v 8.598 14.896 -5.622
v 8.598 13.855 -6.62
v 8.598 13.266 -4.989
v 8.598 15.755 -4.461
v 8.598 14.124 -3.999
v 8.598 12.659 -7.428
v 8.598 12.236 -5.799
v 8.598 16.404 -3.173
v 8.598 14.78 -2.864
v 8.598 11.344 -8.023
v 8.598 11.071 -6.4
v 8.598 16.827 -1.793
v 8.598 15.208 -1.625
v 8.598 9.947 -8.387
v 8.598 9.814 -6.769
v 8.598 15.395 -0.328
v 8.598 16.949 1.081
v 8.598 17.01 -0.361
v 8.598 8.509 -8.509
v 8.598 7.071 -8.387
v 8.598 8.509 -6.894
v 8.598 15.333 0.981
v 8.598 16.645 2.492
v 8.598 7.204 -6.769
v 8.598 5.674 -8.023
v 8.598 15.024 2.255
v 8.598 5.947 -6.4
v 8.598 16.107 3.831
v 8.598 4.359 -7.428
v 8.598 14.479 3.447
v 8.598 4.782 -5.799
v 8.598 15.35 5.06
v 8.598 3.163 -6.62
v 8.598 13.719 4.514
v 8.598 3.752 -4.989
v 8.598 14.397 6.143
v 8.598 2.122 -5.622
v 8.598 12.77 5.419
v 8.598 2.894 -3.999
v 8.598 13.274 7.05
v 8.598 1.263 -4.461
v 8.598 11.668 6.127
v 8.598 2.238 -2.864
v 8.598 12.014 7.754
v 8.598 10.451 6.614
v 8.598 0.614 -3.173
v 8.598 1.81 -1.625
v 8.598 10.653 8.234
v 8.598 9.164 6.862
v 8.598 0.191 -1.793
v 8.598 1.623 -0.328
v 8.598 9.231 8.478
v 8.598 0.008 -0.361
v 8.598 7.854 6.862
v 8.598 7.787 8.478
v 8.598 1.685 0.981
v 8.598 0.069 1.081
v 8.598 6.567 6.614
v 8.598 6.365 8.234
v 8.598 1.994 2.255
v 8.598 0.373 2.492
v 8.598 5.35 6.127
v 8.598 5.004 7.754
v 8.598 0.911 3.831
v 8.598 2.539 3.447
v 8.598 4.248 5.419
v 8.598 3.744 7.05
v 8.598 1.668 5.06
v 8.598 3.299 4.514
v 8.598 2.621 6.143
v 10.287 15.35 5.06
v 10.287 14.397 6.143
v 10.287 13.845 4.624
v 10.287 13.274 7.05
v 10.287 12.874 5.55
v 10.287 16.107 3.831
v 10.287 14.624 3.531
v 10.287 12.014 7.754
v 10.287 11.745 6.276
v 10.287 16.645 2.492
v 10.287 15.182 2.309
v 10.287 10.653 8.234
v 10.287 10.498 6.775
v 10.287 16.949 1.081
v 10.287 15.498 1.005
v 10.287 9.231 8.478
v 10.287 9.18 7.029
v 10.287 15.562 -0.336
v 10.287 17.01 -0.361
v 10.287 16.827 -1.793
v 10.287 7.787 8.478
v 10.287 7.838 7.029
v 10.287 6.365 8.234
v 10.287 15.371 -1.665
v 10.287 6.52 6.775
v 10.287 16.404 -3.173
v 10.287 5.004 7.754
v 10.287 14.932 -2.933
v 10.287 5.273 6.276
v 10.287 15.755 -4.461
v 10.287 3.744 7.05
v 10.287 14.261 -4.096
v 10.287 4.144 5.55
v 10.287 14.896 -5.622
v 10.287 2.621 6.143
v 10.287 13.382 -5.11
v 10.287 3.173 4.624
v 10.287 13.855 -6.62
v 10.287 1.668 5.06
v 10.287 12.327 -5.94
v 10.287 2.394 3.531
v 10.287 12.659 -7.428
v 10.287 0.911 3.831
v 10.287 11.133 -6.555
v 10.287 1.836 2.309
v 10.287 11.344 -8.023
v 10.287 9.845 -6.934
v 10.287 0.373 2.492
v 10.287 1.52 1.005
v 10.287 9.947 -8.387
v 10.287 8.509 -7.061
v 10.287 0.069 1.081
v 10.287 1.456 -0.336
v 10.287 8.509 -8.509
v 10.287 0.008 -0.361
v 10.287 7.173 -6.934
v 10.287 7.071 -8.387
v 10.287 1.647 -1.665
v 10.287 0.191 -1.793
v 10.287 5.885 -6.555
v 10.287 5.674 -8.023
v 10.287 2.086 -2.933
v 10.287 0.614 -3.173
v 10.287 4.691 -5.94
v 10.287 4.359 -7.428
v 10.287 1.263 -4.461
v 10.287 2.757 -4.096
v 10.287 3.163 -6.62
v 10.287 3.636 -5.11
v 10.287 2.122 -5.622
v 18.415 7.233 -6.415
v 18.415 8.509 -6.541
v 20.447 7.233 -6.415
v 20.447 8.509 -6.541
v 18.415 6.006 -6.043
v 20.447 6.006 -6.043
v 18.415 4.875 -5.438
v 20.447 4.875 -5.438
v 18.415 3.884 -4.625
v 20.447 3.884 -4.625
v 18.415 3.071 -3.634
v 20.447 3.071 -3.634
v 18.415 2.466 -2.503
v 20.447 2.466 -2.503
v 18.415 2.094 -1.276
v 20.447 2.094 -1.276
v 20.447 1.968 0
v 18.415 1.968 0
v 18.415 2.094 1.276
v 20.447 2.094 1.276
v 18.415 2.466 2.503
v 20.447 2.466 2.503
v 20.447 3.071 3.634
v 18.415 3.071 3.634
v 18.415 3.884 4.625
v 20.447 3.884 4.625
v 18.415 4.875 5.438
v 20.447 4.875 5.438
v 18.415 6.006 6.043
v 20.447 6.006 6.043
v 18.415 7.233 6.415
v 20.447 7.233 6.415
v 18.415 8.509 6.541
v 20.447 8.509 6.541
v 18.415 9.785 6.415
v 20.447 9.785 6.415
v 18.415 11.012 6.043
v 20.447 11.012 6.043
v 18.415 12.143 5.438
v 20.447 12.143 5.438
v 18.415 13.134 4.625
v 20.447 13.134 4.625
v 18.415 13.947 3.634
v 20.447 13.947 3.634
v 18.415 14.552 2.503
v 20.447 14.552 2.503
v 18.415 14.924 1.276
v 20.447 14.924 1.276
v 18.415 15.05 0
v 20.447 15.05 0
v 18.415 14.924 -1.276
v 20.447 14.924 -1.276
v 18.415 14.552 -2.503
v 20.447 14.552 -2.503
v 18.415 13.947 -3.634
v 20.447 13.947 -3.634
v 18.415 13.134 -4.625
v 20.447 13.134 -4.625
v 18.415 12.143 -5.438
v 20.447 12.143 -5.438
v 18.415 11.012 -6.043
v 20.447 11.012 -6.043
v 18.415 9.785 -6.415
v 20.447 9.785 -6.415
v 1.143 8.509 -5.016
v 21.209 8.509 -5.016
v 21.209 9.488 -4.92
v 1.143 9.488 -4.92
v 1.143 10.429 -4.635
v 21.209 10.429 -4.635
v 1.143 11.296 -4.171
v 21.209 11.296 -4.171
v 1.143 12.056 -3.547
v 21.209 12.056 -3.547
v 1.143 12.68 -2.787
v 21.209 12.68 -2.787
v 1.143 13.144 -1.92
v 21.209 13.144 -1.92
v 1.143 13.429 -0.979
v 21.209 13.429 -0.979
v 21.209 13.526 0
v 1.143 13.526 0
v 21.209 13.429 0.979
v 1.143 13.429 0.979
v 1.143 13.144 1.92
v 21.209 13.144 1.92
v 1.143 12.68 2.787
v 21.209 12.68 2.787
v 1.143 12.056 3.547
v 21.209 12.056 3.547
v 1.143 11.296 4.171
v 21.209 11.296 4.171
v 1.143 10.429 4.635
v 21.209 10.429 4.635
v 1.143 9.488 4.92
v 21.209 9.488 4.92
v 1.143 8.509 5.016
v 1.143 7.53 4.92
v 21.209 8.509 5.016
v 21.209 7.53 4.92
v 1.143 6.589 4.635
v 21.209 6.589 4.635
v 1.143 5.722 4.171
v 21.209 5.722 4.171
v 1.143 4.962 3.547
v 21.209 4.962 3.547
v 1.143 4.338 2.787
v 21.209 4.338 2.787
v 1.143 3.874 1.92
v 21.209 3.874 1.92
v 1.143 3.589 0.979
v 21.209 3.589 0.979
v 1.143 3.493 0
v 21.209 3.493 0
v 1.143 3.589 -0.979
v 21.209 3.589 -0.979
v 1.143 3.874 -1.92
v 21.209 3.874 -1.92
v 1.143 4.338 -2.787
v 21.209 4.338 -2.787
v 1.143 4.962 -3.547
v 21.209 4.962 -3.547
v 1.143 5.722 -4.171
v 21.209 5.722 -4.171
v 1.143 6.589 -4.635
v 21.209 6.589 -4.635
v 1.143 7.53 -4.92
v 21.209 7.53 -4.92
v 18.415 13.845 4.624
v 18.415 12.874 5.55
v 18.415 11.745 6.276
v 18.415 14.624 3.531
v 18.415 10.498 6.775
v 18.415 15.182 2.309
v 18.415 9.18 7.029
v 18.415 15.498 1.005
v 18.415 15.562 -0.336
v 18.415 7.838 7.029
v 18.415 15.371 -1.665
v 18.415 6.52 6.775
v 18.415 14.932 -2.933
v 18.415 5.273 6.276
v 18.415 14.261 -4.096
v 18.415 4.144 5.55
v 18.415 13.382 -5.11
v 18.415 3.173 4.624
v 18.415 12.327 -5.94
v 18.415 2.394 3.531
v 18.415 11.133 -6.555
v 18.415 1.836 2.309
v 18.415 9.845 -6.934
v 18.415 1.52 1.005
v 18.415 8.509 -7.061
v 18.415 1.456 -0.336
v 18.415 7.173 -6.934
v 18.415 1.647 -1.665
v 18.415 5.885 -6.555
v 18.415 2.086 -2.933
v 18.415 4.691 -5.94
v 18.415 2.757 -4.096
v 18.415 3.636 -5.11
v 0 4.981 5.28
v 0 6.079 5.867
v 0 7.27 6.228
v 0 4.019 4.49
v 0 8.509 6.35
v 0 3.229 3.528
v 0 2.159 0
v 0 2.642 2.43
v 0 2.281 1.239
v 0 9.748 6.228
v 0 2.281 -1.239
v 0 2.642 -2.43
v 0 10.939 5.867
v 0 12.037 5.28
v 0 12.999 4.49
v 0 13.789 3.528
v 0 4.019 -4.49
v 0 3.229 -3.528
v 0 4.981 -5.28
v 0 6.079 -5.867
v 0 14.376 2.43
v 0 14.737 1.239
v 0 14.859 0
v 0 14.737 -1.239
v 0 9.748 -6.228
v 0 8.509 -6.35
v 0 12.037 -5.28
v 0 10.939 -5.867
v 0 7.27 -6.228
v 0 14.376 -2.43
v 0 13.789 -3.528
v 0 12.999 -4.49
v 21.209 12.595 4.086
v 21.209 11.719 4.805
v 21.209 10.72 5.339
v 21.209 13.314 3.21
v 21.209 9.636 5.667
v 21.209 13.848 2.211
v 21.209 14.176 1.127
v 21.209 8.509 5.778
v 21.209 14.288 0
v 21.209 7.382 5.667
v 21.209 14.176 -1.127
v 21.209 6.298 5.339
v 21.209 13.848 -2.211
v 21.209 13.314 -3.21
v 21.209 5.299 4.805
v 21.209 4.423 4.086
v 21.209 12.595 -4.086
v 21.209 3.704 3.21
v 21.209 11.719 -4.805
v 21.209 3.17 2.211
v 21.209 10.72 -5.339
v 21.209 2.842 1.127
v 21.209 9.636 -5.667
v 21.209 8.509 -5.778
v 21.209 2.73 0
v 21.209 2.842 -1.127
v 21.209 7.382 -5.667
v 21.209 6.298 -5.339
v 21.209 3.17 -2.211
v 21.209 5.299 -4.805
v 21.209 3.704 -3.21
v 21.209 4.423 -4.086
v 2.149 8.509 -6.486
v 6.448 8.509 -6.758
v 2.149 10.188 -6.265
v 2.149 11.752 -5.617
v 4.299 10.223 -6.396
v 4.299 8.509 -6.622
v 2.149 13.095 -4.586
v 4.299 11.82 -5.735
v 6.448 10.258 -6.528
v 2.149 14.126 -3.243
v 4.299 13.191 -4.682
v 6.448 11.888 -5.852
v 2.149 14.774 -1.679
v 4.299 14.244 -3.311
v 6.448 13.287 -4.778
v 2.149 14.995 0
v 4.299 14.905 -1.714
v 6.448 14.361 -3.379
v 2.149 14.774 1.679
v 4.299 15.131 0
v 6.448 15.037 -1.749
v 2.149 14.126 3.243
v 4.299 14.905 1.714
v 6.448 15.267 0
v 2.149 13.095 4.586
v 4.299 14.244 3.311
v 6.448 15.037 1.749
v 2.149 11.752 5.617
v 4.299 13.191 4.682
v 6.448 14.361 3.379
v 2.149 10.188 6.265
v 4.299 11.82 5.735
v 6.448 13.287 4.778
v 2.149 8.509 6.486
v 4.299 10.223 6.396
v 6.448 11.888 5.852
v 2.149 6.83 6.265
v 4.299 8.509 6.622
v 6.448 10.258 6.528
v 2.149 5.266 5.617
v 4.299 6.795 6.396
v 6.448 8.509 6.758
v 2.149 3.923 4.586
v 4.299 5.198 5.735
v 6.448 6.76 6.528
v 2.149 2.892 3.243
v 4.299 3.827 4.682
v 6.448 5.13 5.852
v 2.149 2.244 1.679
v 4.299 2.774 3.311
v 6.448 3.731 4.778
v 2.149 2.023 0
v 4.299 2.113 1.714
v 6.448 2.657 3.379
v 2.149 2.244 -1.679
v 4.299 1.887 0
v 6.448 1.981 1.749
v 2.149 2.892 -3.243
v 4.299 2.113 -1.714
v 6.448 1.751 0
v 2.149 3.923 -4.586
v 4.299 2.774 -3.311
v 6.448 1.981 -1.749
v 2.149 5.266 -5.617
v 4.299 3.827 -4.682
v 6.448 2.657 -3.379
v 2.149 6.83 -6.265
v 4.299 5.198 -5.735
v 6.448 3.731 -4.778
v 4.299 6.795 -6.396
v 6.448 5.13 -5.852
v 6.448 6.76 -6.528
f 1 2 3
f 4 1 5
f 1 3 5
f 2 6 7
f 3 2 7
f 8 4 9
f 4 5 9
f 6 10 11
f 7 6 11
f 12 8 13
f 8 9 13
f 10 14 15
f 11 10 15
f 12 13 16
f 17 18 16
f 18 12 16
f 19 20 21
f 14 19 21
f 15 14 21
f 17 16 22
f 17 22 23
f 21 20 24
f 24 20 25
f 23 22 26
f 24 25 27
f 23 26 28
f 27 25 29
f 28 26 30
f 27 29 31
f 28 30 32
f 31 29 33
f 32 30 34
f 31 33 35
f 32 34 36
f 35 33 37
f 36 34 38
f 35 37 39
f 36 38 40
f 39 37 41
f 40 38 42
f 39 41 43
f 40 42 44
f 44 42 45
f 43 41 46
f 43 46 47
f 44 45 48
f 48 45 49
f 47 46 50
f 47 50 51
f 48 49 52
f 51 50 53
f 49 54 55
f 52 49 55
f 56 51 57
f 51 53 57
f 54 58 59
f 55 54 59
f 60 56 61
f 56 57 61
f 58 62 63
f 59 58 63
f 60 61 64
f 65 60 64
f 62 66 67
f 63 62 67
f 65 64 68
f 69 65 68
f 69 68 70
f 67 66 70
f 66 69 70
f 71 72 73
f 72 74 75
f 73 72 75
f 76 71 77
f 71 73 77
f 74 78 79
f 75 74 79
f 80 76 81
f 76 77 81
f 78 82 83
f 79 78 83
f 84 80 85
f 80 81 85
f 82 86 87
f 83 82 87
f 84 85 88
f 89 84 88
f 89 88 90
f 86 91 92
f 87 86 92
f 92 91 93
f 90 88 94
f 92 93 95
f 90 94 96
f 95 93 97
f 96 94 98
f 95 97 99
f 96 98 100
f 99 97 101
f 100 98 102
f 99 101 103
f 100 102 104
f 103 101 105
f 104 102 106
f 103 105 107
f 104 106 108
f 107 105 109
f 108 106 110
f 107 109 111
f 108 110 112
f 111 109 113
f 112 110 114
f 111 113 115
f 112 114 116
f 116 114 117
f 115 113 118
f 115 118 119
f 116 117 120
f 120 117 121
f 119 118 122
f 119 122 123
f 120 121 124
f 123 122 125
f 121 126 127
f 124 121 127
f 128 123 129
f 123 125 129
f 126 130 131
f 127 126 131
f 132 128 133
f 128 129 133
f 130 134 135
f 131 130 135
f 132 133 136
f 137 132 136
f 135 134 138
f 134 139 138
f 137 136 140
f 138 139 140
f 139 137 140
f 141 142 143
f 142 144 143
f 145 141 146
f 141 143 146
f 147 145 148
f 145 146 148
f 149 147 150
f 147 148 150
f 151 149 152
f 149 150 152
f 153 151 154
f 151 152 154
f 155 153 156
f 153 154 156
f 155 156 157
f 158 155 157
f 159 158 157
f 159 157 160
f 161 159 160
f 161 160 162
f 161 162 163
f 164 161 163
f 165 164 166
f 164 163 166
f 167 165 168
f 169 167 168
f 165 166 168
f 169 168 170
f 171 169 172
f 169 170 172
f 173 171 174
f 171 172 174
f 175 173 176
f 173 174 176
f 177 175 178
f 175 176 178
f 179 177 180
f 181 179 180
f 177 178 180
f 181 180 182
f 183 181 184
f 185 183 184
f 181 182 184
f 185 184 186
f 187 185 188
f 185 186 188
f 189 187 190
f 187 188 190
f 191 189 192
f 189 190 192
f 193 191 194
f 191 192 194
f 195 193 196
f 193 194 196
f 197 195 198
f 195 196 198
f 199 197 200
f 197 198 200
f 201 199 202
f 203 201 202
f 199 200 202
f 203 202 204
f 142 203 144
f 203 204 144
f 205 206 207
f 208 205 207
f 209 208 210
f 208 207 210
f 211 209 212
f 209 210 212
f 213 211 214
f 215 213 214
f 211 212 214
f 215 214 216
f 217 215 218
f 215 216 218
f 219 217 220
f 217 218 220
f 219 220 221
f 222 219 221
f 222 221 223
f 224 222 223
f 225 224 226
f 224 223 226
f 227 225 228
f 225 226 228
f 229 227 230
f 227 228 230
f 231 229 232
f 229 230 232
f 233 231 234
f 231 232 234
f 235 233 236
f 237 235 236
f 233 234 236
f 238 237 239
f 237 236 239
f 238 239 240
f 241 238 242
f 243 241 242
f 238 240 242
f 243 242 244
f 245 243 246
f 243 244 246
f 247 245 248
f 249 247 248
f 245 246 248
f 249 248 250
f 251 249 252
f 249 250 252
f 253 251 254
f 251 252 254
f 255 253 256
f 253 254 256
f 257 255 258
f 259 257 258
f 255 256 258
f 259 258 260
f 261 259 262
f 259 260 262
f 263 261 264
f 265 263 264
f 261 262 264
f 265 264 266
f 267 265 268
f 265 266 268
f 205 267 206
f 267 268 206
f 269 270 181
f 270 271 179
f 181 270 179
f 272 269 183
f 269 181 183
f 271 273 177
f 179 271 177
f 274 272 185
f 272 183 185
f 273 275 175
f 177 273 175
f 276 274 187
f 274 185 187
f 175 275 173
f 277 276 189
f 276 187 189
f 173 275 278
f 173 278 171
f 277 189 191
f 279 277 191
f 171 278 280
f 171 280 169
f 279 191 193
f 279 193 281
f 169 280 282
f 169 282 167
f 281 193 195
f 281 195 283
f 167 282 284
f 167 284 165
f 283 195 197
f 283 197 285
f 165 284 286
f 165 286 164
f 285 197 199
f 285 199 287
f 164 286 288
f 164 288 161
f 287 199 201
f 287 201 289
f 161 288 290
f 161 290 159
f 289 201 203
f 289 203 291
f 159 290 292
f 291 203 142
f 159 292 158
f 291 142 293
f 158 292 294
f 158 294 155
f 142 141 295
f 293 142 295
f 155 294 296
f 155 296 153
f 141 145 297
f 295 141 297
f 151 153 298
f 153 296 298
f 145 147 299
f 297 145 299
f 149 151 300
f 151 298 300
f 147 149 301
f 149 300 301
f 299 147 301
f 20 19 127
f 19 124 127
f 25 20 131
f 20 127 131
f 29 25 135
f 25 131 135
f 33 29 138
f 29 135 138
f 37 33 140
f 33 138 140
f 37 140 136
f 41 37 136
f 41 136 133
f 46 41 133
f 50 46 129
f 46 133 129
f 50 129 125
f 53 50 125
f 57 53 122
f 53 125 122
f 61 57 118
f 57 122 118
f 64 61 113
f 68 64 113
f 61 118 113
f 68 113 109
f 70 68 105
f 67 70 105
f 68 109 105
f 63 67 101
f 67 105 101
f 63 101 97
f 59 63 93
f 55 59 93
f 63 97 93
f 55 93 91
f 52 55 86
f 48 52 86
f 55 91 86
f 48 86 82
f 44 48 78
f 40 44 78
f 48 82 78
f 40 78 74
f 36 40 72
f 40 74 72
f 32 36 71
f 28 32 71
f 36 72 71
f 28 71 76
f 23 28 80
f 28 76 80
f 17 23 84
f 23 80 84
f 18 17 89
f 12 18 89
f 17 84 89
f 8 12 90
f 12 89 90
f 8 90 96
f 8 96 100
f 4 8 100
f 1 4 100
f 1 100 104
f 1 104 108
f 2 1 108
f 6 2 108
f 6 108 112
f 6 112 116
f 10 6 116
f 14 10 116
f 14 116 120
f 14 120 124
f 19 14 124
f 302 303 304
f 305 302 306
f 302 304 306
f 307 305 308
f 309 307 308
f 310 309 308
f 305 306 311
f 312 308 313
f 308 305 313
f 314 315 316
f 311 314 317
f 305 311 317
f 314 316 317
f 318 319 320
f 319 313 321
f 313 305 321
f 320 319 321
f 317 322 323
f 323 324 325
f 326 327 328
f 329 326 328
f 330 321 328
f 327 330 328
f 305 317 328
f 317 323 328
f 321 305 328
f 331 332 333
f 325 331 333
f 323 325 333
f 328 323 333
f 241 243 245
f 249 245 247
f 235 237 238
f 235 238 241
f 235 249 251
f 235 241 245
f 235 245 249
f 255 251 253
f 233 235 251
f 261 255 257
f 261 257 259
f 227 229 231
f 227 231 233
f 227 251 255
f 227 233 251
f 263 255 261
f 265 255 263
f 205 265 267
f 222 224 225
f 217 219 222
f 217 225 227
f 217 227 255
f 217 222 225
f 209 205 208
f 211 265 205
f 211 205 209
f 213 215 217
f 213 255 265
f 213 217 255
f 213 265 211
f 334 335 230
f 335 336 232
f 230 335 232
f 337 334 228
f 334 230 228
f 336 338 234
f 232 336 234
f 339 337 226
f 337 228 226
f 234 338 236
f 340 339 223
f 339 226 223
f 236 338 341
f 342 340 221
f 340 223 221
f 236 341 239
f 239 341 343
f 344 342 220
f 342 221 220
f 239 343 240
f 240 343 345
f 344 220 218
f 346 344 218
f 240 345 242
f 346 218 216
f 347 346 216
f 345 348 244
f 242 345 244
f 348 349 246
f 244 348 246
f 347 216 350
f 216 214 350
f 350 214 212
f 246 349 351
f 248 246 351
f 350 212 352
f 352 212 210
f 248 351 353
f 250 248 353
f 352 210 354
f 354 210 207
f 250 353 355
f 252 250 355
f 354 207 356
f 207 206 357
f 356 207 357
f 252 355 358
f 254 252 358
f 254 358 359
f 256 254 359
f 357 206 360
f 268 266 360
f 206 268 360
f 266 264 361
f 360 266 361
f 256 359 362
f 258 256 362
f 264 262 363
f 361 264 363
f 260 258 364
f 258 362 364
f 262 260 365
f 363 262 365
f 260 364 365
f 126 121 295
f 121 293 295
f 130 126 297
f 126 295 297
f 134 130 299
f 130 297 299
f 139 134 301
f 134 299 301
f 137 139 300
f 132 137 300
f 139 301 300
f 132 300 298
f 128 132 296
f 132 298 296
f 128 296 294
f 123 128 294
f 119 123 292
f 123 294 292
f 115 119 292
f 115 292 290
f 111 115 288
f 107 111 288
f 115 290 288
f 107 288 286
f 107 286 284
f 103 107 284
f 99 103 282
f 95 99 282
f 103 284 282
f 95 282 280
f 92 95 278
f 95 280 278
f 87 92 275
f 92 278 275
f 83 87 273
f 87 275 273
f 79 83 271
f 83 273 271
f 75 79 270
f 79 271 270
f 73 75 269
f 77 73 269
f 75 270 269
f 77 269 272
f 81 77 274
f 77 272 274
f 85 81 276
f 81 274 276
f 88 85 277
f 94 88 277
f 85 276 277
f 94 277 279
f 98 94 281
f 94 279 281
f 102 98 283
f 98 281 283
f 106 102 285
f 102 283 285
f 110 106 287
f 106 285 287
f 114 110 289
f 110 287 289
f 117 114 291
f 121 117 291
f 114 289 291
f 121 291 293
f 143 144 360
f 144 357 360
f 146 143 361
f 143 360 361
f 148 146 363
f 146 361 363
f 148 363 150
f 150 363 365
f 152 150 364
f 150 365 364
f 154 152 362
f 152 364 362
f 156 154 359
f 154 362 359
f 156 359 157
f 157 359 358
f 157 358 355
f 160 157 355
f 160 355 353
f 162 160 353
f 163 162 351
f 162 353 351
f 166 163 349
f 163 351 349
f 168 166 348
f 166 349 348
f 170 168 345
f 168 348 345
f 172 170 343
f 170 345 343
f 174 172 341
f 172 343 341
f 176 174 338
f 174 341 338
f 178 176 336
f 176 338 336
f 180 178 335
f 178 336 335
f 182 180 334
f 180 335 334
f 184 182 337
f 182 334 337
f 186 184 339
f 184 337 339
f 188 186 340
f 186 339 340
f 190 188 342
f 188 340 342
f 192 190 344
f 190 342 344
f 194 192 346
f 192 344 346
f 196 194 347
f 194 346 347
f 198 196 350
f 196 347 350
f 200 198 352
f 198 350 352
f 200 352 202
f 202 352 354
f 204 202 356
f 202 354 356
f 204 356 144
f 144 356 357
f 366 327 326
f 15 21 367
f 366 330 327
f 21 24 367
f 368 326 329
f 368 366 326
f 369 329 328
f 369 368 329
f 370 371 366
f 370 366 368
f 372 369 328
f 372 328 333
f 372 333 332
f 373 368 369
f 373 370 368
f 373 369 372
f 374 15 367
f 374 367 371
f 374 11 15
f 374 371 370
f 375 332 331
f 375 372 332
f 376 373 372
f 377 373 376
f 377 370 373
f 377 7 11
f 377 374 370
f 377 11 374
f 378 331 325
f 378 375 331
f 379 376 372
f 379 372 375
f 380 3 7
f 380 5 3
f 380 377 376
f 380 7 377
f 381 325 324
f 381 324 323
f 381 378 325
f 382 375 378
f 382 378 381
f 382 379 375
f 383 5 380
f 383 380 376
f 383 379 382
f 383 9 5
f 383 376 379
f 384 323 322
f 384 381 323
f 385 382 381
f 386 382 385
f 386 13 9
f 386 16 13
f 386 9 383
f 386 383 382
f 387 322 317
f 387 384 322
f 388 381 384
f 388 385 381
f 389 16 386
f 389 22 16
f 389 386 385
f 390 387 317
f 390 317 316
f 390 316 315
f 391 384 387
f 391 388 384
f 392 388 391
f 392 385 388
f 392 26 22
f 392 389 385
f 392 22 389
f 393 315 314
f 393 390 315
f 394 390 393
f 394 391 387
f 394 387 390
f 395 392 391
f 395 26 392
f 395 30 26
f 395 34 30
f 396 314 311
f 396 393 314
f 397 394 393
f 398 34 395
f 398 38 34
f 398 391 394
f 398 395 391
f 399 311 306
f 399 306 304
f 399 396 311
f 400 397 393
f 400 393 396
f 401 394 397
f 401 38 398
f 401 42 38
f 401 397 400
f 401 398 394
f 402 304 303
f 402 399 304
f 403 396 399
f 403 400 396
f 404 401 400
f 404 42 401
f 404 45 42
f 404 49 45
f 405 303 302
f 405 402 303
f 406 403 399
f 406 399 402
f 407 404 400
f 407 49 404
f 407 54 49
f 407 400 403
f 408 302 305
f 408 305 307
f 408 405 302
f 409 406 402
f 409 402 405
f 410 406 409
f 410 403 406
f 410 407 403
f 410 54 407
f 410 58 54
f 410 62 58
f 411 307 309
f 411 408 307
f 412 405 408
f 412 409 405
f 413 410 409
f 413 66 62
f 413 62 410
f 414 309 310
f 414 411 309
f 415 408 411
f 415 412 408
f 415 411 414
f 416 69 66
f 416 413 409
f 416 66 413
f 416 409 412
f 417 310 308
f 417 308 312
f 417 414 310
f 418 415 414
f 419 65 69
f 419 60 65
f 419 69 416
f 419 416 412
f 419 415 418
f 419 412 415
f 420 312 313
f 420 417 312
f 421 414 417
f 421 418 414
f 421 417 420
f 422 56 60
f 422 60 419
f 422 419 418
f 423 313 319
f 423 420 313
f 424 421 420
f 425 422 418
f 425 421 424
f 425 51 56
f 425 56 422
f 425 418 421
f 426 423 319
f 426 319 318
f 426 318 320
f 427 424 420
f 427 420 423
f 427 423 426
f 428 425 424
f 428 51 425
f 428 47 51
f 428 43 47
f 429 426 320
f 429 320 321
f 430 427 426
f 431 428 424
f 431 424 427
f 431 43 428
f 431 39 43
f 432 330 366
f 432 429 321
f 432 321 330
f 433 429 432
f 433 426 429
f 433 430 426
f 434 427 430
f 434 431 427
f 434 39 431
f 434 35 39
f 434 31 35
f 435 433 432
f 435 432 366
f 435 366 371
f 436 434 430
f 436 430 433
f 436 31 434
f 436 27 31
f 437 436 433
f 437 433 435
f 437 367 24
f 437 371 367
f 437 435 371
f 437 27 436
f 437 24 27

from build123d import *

# Parameters (mm, degrees)
SKETCH3_R      = 6.35
SKETCH5_R      = 6.8961
SKETCH7_R      = 5.0165
EXTRUDE2_DEPTH = 20.066


with BuildPart() as part:
    # Sketch2 → Revolve1 (revolve)
    with BuildSketch(Plane.XY, mode=Mode.PRIVATE) as revolve1_sk:
        Polygon((18.415, 1.9685), (20.447, 1.9685), (21.209, 2.7305), (21.209, 8.509), (8.5979, 8.509), (8.5979, 1.524), (8.5979, 0), (10.287, 0), (10.287, 1.4478), (18.415, 1.4478), align=None)
    revolve(revolve1_sk.sketch.rotate(Axis((21.209, 8.509, 0), (-1, 0, 0)), 270), axis=Axis((21.209, 8.509, 0), (-1, 0, 0)))

    # Sketch3 → Loft2 section 0
    with BuildSketch(Plane(origin=(0, 0, 0), x_dir=(0, 0, -1), z_dir=(1, 0, 0))):
        with Locations((0, 8.509)):
            Circle(SKETCH3_R)
    # Sketch5 → Loft2 section 1
    with BuildSketch(Plane(origin=(8.636, 0, 0), x_dir=(0, 0, -1), z_dir=(1, 0, 0))):
        with Locations((0, 8.509)):
            Circle(SKETCH5_R)
    loft()

    # Sketch7 → Extrude2 (cut)
    with BuildSketch(Plane(origin=(21.209, 0, 0), x_dir=(0, 0, -1), z_dir=(1, 0, 0))):
        with Locations((0, 8.509)):
            Circle(SKETCH7_R)
    extrude(amount=-EXTRUDE2_DEPTH, mode=Mode.SUBTRACT)


solid = part.part
